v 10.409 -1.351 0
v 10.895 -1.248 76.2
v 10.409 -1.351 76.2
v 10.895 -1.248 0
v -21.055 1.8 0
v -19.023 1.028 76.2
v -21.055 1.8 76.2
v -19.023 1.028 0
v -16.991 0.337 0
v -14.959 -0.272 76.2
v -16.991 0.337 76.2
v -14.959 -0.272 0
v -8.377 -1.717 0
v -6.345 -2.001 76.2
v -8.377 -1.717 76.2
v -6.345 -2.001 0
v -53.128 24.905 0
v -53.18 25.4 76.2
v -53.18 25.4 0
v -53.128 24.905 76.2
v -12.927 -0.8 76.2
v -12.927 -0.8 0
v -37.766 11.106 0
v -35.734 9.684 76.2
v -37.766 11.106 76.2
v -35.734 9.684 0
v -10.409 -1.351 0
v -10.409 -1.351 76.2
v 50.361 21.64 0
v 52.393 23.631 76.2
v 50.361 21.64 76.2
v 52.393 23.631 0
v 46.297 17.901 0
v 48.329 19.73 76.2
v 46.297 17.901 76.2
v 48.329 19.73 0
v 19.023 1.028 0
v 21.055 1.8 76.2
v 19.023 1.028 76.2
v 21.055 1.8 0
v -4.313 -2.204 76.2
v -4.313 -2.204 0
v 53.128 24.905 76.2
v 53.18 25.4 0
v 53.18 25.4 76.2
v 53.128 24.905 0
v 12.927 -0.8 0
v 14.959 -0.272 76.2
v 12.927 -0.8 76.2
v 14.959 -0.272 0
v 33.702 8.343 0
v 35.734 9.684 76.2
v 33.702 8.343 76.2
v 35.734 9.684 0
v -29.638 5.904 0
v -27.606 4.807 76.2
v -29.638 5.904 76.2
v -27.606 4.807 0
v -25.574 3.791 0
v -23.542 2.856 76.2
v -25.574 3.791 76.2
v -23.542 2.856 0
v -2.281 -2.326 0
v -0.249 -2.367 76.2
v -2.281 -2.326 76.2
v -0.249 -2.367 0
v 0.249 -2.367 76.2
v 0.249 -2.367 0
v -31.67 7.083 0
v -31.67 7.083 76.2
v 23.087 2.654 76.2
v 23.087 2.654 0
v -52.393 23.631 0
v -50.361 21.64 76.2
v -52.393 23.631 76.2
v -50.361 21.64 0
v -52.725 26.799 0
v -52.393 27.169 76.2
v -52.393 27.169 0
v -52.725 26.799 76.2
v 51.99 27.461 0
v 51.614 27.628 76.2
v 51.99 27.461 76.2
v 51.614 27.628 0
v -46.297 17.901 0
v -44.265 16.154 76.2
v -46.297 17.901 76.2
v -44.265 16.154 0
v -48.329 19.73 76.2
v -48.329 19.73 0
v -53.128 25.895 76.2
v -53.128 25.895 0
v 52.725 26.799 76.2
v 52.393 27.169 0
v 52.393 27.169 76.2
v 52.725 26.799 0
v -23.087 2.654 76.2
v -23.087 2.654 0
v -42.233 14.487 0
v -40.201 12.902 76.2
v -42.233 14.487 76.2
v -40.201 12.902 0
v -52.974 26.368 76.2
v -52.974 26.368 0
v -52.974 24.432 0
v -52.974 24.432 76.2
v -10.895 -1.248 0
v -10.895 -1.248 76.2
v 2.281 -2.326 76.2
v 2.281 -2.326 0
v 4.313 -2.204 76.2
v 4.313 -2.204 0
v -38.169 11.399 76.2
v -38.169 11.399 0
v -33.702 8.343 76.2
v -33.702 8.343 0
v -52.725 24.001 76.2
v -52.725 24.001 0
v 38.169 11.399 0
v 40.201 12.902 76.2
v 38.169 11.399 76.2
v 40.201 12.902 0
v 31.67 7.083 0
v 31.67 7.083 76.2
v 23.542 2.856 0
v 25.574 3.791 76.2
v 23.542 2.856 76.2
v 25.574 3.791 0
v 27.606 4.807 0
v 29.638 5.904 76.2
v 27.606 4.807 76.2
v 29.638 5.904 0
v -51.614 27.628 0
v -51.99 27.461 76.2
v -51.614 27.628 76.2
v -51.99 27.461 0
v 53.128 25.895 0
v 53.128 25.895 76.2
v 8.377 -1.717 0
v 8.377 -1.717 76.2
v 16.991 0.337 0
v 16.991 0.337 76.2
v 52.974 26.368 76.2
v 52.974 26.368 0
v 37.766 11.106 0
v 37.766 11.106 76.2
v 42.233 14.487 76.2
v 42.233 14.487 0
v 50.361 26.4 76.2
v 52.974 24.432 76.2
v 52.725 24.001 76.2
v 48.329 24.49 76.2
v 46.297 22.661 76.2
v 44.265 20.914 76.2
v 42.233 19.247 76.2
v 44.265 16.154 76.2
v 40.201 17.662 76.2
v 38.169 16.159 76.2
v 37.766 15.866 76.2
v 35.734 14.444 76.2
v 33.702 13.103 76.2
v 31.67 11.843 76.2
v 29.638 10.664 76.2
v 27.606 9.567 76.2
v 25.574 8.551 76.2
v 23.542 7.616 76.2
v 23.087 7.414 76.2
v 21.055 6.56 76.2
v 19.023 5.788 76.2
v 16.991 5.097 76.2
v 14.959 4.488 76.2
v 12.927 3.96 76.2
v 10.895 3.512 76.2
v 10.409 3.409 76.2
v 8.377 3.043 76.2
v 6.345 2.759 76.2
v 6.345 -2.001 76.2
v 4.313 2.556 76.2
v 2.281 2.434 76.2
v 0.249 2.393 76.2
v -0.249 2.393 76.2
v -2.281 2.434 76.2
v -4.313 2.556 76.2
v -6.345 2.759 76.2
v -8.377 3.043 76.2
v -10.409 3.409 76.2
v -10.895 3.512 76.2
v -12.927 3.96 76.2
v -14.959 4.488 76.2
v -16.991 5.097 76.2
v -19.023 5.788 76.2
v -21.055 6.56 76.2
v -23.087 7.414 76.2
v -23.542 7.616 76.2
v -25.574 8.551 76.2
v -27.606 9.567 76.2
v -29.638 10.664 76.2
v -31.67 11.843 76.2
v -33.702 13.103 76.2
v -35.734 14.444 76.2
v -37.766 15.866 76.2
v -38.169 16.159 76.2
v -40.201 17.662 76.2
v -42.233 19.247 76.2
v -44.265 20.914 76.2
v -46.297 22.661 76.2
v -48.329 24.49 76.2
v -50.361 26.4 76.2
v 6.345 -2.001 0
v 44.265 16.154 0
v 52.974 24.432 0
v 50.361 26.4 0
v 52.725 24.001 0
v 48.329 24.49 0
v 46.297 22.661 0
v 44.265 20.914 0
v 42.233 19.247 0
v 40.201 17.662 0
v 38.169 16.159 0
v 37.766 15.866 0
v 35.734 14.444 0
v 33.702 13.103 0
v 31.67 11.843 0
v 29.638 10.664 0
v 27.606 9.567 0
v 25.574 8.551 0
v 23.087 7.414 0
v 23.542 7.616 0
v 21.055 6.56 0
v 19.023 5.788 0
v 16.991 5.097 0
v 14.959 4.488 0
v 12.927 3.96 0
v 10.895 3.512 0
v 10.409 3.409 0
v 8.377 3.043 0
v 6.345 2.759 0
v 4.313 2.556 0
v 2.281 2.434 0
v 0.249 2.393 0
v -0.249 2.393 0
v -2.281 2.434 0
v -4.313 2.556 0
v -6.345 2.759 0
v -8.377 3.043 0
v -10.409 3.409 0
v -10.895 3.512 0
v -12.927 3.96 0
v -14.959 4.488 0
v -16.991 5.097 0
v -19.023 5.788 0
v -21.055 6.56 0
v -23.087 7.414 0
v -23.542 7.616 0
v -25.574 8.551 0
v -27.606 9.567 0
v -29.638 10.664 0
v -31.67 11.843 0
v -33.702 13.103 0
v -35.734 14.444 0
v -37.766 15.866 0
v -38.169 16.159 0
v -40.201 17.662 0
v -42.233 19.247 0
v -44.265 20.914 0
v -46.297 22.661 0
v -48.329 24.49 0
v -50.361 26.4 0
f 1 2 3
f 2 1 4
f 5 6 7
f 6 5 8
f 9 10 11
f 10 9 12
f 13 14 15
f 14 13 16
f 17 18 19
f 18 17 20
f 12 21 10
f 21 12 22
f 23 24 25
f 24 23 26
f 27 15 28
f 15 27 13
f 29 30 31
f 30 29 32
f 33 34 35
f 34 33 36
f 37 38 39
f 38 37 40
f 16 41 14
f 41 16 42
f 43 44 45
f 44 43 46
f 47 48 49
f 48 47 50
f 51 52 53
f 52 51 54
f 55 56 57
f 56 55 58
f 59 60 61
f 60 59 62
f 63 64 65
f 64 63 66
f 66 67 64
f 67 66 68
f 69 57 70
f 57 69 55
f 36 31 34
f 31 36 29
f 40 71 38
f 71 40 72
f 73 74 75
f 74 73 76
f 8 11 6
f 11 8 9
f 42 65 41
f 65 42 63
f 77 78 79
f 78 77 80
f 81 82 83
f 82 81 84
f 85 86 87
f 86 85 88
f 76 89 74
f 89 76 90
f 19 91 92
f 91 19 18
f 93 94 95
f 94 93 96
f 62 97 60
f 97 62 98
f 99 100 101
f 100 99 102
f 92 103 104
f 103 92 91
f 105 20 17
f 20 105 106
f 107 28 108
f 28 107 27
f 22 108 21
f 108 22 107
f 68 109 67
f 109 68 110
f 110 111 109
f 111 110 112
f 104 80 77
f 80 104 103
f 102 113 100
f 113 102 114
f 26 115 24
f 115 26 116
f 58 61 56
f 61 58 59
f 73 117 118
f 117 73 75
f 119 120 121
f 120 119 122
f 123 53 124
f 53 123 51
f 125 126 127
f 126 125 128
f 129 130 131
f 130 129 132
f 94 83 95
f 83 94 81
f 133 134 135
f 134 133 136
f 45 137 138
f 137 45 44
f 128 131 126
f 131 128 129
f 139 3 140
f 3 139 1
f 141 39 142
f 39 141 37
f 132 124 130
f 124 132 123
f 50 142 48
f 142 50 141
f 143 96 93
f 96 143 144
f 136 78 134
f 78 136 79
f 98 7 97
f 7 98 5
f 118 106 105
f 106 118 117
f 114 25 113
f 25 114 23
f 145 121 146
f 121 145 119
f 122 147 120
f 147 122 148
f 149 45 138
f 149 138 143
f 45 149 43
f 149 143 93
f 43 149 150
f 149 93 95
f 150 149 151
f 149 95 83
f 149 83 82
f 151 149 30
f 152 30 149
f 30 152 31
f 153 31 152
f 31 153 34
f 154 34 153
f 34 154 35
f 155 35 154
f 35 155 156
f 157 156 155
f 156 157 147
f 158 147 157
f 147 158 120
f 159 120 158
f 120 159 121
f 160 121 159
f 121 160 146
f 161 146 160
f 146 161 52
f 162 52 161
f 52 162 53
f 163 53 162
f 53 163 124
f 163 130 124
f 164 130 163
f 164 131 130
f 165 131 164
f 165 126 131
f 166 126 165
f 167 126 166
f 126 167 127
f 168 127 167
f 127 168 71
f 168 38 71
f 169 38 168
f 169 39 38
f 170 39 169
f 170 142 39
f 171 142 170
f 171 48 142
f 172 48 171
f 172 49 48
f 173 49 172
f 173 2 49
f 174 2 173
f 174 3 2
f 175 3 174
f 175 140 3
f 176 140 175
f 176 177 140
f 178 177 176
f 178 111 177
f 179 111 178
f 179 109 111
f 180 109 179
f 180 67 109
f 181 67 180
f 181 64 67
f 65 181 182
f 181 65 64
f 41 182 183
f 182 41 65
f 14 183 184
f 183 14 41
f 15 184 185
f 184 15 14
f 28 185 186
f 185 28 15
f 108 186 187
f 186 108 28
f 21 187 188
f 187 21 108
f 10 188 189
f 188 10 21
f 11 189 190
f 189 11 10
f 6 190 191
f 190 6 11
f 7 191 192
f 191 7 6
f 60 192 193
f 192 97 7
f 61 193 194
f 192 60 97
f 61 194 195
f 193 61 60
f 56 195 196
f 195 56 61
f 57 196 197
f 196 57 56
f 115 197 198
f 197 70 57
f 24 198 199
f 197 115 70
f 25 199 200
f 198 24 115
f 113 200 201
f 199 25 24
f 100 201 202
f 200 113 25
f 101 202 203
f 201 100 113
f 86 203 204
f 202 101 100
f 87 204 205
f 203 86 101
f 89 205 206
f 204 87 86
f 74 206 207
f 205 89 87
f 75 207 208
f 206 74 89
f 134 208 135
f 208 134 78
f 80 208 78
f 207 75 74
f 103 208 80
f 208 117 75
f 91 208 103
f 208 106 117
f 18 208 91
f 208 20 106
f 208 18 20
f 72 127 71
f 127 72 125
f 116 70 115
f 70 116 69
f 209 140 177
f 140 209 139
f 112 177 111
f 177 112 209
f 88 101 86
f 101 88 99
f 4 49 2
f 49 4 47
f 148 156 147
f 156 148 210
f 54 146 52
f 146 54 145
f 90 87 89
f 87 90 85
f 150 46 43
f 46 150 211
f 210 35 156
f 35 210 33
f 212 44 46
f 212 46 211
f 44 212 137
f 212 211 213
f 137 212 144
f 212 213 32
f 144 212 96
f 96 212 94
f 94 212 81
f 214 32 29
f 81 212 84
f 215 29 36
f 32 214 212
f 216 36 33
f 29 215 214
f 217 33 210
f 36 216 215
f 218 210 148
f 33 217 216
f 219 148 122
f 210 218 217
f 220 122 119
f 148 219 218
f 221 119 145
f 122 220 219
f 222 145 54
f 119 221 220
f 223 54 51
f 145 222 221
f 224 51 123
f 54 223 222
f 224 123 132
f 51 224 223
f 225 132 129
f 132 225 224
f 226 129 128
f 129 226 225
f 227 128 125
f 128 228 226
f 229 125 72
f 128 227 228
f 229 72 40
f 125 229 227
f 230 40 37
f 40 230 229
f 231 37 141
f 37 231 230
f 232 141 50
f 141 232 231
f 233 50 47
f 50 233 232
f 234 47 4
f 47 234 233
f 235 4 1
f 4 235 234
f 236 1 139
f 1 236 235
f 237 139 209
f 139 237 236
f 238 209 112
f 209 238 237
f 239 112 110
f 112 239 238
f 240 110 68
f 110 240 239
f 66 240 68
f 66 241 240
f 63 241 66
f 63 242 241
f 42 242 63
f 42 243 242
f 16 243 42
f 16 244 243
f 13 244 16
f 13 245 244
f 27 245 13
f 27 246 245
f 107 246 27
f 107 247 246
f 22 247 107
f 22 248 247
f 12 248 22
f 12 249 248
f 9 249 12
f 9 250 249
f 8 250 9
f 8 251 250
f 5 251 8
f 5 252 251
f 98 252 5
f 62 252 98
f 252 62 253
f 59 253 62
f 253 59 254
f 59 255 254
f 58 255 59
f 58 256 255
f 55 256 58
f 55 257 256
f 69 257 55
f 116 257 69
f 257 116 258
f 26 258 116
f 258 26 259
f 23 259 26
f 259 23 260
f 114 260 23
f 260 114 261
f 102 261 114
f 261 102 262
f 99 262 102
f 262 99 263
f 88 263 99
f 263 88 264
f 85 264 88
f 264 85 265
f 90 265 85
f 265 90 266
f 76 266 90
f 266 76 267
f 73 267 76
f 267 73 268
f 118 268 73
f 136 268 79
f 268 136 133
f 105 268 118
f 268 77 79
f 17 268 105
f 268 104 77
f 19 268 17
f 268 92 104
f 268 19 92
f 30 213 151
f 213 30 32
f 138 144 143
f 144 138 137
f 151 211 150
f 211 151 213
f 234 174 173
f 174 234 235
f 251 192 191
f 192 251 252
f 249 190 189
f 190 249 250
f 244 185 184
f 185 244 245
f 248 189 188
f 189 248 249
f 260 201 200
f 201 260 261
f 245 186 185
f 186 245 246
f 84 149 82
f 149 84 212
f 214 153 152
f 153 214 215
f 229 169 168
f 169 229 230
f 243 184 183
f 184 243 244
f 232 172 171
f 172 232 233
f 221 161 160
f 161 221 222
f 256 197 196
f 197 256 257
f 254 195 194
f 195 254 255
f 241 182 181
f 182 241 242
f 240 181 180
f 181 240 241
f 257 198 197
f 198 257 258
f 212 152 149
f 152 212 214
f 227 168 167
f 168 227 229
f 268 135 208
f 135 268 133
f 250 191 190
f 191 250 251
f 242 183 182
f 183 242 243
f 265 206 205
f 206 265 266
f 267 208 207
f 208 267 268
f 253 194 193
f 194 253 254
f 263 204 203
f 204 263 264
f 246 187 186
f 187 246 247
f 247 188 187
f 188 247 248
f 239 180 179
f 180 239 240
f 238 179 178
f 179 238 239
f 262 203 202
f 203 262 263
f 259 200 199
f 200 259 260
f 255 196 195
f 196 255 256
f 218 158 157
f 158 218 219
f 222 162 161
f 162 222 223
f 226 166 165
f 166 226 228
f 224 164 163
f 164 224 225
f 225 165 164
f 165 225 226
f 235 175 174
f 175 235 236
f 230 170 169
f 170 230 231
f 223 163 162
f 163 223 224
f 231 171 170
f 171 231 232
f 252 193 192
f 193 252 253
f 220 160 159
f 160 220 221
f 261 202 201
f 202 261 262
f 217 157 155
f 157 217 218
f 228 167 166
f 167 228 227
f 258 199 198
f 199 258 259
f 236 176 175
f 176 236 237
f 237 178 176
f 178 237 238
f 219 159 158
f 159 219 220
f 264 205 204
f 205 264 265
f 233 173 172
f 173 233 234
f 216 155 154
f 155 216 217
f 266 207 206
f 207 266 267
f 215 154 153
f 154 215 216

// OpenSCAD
// Created by Andrew Moore 2016
//  For questions, please PM me on Thingiverse
//  www.thingiverse.com/TacPar
//
//  Builds a parabolic plate 
//  according to the formula:
//         y= kx^2
//
//  Where the focal length is 1/(4*k)
//   
//
//  This code is designed for 
//  ease of use, not for computational
//  efficiency. You must be patient 
//  when rendering!
//=============================

//to do: 
//      Add text label for parabola parameters
//      Add base with indicator of focal point

//=============================
//Global Constants: 
//  Don't change these. It will break the code.
//=============================
inch = 25.4+0;//added zero to remove variable from customizer

//=============================
//Compiler Options: 
//These will change your viewing options in OpenSCAD
//=============================
$fn = 30+0; //added zero to remove variable from customizer  

//=============================
//Global Print Variables:
//  These variables will adjust how the part is printed 
//  but not affect the overall part shape
//=============================
numfaces = 50+0; //this adjusts how smooth the parabolic shape will be

//=============================
//Global Mechanical Variables: 
//  Change these to adjust physical properties of the part
//=============================
Plate_Width = 101.6;//4*inch;
Plate_Height = 76.2;//3*inch;
Plate_Thickness = 4.76;//3/16*inch;
focal_length = 25.4;


//==============================
//Calculated Variables: 
//Do not Change these directly
//==============================
k=1/(4*focal_length);

module main()
{
    //add global logic and call part modules here
    difference()
    {
        hull()
        {
            parabolic_dish();
        }
        translate([0,Plate_Thickness, -0.01]) scale([1,1,1.1]) hull()
        {
            parabolic_dish();
        }    
    }
        
}

module parabolic_dish()
{
   
   difference()
   {
		positives();
		negatives();
    }    
   module positives()
   {
        for(i=[0:numfaces/2])
        {
            xi = i*Plate_Width/numfaces; 
            yi = k*(xi*xi);
       
            translate([xi,yi,0]) 
                cylinder(r=Plate_Thickness/2, h=Plate_Height);
                
            translate([-xi,yi,0]) 
                cylinder(r=Plate_Thickness/2, h=Plate_Height);
        } 
   }
    module negatives()
   {
       //Use this section to put holes in the part
       //for example: mounting holes, etc.
   }   
}

//execute program and draw the part(s)
main();
